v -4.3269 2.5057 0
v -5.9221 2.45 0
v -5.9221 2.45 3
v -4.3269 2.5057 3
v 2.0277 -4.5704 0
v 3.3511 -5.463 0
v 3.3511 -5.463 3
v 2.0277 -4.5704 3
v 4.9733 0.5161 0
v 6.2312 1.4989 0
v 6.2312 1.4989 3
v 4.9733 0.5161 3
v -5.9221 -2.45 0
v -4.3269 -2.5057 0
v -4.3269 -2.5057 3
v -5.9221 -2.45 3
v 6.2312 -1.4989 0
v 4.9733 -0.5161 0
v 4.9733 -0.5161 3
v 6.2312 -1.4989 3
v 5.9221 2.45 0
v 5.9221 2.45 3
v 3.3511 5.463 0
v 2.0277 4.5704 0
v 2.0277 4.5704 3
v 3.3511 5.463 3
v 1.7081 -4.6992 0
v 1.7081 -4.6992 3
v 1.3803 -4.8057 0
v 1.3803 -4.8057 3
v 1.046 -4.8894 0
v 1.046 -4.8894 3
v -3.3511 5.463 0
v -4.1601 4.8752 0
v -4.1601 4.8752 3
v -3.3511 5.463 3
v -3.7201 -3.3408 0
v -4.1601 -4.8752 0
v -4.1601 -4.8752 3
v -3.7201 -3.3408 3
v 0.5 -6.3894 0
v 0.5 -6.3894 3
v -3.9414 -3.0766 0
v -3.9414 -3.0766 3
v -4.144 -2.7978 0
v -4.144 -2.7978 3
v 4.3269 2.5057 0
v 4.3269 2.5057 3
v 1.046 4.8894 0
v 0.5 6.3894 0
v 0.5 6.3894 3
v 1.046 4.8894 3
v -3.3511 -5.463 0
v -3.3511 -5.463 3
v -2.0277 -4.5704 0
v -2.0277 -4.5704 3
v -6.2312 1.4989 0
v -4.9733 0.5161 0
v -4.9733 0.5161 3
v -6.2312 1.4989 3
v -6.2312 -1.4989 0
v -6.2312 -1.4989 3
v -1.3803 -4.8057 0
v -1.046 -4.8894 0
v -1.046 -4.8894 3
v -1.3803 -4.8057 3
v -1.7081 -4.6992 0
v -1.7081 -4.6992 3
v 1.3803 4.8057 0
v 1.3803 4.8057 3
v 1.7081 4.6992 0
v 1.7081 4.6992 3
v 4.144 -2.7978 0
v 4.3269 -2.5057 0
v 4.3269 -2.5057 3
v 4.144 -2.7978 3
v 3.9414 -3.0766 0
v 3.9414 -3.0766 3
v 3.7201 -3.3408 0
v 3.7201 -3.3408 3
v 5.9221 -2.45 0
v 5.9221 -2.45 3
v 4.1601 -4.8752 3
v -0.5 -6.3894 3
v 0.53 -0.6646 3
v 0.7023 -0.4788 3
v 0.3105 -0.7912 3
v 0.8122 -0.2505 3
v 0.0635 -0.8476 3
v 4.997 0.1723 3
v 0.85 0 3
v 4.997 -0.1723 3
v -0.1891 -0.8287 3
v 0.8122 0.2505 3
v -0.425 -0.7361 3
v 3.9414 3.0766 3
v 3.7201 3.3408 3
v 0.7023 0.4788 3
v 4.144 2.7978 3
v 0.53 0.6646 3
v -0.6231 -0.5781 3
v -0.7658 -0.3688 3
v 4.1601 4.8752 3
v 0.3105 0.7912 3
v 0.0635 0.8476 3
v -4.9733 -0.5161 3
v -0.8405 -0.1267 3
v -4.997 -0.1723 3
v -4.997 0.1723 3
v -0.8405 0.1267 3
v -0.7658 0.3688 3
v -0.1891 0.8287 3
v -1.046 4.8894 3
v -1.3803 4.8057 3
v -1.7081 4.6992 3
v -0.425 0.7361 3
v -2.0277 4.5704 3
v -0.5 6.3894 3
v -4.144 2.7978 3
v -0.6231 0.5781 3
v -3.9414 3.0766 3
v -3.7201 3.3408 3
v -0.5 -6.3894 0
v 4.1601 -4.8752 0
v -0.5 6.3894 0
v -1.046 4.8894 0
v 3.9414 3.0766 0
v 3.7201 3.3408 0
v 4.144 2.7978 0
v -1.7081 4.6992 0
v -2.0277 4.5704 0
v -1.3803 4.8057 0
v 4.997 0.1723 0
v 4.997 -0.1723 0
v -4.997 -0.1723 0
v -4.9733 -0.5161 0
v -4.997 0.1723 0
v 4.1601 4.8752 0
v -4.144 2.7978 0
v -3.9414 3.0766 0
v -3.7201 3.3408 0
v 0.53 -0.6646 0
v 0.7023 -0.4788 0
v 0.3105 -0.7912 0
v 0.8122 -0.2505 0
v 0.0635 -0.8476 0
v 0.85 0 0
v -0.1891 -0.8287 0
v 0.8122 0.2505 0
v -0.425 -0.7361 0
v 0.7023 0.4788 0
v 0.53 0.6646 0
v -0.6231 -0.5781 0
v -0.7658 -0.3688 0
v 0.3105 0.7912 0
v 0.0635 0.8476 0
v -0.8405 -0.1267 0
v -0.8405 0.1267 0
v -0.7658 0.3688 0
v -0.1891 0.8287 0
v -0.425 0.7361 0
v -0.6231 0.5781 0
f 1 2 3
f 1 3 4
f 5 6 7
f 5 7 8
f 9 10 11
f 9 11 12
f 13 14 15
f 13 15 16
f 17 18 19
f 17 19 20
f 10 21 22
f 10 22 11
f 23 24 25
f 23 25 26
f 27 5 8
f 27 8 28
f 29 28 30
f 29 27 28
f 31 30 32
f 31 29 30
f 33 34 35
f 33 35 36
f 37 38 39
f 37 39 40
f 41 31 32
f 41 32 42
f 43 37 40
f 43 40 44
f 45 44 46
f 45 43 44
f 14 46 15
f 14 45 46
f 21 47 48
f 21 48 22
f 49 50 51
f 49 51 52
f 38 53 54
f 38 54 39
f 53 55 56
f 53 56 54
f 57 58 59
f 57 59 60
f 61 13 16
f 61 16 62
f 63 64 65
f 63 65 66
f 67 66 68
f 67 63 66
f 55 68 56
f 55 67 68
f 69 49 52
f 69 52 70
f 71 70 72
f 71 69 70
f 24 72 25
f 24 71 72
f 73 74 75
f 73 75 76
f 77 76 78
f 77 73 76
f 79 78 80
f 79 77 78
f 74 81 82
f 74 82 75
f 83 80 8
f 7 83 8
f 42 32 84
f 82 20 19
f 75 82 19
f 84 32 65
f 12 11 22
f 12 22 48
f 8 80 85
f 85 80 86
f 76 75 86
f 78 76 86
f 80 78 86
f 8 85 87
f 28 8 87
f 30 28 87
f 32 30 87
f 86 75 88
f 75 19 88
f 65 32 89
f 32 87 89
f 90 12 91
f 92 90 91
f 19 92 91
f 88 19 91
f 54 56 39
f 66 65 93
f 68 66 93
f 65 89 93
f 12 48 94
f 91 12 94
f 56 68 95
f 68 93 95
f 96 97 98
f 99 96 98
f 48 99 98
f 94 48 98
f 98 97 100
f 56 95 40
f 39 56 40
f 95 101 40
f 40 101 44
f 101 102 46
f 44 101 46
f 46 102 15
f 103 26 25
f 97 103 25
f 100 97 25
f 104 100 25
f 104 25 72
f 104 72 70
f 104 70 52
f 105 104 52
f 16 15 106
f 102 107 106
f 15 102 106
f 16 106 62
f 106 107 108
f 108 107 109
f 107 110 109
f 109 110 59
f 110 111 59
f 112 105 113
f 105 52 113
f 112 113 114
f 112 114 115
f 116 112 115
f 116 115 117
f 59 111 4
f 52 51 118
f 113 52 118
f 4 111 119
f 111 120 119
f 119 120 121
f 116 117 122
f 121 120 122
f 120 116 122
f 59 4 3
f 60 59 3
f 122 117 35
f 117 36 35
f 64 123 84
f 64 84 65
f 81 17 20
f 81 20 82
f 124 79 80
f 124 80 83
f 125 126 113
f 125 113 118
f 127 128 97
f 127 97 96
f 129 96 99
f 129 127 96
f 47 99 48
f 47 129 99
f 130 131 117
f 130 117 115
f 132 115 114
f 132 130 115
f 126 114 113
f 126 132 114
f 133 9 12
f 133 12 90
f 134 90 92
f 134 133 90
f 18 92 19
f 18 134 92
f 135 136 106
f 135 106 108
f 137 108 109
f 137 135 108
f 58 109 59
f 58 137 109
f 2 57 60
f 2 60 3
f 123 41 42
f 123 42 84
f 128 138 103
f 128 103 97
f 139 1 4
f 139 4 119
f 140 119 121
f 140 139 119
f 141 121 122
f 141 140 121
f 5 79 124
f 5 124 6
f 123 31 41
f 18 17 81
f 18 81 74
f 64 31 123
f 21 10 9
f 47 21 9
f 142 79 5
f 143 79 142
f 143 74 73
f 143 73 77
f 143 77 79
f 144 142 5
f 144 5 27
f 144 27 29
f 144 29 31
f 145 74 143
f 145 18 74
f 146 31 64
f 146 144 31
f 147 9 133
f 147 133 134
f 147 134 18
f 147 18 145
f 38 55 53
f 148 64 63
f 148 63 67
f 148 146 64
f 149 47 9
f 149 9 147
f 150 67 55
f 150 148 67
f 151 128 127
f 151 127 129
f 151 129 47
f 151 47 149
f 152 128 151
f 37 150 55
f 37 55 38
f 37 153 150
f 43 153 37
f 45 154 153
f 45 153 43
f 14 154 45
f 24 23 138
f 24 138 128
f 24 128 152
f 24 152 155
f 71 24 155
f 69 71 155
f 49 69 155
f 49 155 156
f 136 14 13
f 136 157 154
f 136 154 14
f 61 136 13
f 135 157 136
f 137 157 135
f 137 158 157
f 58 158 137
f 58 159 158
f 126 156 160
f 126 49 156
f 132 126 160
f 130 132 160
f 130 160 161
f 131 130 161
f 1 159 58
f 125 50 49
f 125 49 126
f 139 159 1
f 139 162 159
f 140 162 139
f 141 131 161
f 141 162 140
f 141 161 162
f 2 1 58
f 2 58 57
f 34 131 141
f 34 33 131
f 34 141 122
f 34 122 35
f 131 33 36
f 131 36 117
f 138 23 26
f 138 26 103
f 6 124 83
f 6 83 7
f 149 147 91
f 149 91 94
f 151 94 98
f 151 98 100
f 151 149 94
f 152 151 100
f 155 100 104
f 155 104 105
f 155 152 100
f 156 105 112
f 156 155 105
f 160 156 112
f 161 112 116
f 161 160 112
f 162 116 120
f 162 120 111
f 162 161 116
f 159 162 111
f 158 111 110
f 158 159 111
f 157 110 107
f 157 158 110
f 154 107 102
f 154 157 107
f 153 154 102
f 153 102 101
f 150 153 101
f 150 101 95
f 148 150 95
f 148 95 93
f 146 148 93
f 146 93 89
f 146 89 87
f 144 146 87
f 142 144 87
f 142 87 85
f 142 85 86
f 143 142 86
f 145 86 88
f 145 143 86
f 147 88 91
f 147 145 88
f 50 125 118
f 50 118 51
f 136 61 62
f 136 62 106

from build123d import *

# Parameters (mm, degrees)
SKETCH1_R           = 0.85
BOSS_EXTRUDE1_DEPTH = 3


with BuildPart() as part:
    # Sketch1 → Boss-Extrude1 (new body)
    with BuildSketch(Plane.XY):
        with BuildLine():
            Line((-1.045955351, 4.889373927), (-0.5, 6.389373927))
            Line((-0.5, 6.389373927), (0.5, 6.389373927))
            Line((0.5, 6.389373927), (1.045955351, 4.889373927))
            ThreePointArc((1.045955351, 4.889373927), (1.545084972, 4.755282581), (2.027706233, 4.570383729))
            Line((2.027706233, 4.570383729), (3.351071269, 5.463004717))
            Line((3.351071269, 5.463004717), (4.160088263, 4.875219465))
            Line((4.160088263, 4.875219465), (3.720097542, 3.340789469))
            ThreePointArc((3.720097542, 3.340789469), (4.045084972, 2.938926261), (4.326852955, 2.505662288))
            Line((4.326852955, 2.505662288), (5.922147212, 2.449953385))
            Line((5.922147212, 2.449953385), (6.231164206, 1.498896869))
            Line((6.231164206, 1.498896869), (4.973288913, 0.516136983))
            ThreePointArc((4.973288913, 0.516136983), (5, 0), (4.973288913, -0.516136983))
            Line((4.973288913, -0.516136983), (6.231164206, -1.498896869))
            Line((6.231164206, -1.498896869), (5.922147212, -2.449953385))
            Line((5.922147212, -2.449953385), (4.326852955, -2.505662288))
            ThreePointArc((4.326852955, -2.505662288), (4.045084972, -2.938926261), (3.720097542, -3.340789469))
            Line((3.720097542, -3.340789469), (4.160088263, -4.875219465))
            Line((4.160088263, -4.875219465), (3.351071269, -5.463004717))
            Line((3.351071269, -5.463004717), (2.027706233, -4.570383729))
            ThreePointArc((2.027706233, -4.570383729), (1.545084972, -4.755282581), (1.045955351, -4.889373927))
            Line((1.045955351, -4.889373927), (0.5, -6.389373927))
            Line((0.5, -6.389373927), (-0.5, -6.389373927))
            Line((-0.5, -6.389373927), (-1.045955351, -4.889373927))
            ThreePointArc((-1.045955351, -4.889373927), (-1.545084972, -4.755282581), (-2.027706233, -4.570383729))
            Line((-2.027706233, -4.570383729), (-3.351071269, -5.463004717))
            Line((-3.351071269, -5.463004717), (-4.160088263, -4.875219465))
            Line((-4.160088263, -4.875219465), (-3.720097542, -3.340789469))
            ThreePointArc((-3.720097542, -3.340789469), (-4.045084972, -2.938926261), (-4.326852955, -2.505662288))
            Line((-4.326852955, -2.505662288), (-5.922147212, -2.449953385))
            Line((-5.922147212, -2.449953385), (-6.231164206, -1.498896869))
            Line((-6.231164206, -1.498896869), (-4.973288913, -0.516136983))
            ThreePointArc((-4.973288913, -0.516136983), (-5, 0), (-4.973288913, 0.516136983))
            Line((-4.973288913, 0.516136983), (-6.231164206, 1.498896869))
            Line((-6.231164206, 1.498896869), (-5.922147212, 2.449953385))
            Line((-5.922147212, 2.449953385), (-4.326852955, 2.505662288))
            ThreePointArc((-4.326852955, 2.505662288), (-4.045084972, 2.938926261), (-3.720097542, 3.340789469))
            Line((-3.720097542, 3.340789469), (-4.160088263, 4.875219465))
            Line((-4.160088263, 4.875219465), (-3.351071269, 5.463004717))
            Line((-3.351071269, 5.463004717), (-2.027706233, 4.570383729))
            ThreePointArc((-2.027706233, 4.570383729), (-1.545084972, 4.755282581), (-1.045955351, 4.889373927))
        make_face()
        Circle(SKETCH1_R, mode=Mode.SUBTRACT)
    extrude(amount=BOSS_EXTRUDE1_DEPTH)


solid = part.part
